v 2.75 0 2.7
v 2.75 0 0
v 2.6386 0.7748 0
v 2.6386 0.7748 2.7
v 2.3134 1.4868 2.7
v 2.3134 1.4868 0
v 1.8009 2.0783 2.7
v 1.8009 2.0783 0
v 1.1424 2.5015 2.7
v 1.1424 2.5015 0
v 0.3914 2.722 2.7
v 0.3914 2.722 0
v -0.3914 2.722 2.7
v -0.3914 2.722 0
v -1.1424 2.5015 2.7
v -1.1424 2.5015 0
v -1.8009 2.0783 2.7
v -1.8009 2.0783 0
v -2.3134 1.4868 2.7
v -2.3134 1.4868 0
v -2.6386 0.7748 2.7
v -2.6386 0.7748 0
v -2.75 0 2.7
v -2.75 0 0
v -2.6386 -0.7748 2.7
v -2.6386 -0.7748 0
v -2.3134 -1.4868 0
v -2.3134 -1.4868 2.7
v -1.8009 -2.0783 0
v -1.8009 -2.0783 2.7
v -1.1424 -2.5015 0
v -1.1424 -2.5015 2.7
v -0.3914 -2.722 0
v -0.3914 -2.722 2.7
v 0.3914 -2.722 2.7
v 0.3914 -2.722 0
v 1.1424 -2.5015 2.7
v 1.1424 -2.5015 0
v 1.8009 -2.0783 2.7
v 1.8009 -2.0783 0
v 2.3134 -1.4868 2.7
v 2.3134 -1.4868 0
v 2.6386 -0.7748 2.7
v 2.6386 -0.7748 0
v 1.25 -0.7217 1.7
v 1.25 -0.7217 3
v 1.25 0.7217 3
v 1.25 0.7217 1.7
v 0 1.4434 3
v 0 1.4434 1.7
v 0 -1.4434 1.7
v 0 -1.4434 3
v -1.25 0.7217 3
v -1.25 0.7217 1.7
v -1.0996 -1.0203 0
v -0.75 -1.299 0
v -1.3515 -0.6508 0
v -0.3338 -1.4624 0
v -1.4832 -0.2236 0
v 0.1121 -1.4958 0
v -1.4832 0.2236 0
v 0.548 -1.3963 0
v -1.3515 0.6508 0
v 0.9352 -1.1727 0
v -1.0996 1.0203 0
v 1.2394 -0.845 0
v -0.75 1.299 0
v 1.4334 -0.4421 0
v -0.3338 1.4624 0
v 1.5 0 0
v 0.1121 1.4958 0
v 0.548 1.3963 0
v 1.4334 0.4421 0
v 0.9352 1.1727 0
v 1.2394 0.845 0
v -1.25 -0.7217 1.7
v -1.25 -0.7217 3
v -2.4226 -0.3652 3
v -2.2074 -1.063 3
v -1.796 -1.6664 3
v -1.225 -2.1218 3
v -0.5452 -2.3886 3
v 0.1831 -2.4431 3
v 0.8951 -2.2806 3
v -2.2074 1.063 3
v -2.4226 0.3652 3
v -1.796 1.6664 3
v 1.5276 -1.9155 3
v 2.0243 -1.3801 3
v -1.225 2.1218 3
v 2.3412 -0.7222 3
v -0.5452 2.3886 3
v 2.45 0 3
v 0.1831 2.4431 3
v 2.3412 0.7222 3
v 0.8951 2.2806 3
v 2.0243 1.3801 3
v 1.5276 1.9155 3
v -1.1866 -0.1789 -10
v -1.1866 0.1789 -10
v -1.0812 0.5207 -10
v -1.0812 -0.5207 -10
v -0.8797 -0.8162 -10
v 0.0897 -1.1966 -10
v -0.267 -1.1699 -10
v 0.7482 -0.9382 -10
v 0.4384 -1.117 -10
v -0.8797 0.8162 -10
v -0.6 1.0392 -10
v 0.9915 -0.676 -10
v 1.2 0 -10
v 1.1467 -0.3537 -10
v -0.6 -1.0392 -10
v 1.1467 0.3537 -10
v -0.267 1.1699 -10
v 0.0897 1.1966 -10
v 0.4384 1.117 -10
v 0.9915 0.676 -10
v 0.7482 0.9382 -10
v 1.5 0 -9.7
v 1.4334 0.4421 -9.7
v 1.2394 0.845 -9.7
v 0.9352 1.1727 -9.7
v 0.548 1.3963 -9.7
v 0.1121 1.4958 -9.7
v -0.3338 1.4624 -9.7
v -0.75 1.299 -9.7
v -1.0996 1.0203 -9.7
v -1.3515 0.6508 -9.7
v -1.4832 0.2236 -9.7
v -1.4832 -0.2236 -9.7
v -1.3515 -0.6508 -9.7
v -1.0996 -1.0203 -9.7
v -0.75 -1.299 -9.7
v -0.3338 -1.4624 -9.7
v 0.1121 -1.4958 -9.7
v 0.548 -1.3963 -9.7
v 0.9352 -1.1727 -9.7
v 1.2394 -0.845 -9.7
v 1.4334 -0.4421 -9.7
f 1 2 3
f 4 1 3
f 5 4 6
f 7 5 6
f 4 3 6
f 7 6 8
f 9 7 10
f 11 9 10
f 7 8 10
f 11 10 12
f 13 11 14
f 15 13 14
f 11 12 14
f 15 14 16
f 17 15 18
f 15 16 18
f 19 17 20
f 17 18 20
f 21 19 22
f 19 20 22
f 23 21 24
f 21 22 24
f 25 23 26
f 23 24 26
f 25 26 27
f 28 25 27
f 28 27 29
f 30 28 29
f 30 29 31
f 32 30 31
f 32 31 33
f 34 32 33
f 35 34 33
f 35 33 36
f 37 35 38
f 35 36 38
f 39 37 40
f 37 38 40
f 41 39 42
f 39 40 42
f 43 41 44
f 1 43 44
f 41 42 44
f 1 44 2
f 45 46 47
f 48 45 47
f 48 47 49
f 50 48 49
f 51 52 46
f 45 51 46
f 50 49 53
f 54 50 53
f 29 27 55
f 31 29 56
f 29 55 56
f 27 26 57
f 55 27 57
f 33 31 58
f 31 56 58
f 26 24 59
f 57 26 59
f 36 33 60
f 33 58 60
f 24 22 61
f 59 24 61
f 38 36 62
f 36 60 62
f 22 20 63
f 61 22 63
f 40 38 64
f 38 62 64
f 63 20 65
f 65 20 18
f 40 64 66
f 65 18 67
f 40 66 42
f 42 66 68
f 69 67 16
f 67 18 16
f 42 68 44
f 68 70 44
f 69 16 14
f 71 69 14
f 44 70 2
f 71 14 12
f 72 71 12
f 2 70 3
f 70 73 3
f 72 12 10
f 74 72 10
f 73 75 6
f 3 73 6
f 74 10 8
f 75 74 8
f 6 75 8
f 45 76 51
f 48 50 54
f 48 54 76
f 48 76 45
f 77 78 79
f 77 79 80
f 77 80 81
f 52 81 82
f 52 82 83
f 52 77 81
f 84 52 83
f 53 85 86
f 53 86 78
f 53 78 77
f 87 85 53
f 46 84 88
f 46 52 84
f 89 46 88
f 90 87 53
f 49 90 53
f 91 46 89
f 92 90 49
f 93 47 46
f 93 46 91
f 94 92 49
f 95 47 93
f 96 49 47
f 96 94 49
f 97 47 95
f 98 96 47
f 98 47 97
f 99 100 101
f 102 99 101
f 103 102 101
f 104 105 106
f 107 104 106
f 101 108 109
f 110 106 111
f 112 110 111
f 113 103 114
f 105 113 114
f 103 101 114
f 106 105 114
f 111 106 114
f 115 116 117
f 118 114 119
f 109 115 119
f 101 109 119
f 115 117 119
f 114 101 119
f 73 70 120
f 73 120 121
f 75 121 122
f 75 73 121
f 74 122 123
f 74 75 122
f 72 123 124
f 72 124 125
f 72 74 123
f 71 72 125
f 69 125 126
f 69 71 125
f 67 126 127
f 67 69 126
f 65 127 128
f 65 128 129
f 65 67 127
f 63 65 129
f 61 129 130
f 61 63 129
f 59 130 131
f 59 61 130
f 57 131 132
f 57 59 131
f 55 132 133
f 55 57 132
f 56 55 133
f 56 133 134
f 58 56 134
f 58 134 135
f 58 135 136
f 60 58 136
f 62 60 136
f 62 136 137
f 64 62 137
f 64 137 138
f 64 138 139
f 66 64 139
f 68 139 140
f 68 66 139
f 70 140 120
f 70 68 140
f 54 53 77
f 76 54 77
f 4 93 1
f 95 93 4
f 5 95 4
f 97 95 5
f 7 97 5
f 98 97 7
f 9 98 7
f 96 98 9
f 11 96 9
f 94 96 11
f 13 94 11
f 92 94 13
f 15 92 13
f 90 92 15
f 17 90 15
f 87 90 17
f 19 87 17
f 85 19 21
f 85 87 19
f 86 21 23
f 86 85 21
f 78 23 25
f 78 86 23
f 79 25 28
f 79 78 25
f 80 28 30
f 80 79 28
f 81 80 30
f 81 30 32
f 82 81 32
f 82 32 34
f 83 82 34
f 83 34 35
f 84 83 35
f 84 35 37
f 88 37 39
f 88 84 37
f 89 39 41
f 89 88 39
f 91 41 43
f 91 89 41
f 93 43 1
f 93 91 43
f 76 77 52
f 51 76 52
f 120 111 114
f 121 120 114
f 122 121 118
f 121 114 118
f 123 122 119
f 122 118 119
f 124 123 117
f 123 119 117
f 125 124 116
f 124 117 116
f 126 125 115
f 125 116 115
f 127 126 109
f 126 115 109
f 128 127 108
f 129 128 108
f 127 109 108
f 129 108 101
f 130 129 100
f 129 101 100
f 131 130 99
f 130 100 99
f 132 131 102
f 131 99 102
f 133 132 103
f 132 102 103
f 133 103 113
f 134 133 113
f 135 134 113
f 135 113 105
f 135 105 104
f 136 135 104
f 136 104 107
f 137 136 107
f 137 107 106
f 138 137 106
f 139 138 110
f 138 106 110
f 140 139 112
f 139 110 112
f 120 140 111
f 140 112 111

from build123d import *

# Parameters (mm, degrees)
F2_R      = 1.5
F3_DEPTH  = 10
F2_R_2    = 2.75
F3_FACE_R = 1.5
F4_DEPTH  = 3
F5_SIZE   = 0.3
F7_DEPTH  = 1.3


with BuildPart() as f3:
    # F2 (on Top) → F3 (new body)
    with BuildSketch(Plane.XY):
        Circle(F2_R)
    extrude(amount=-F3_DEPTH)

    # F2 (on Top) + F3_face (on face) → F4 (join)
    with BuildSketch(Plane.XY):
        Circle(F2_R_2)
        Circle(F2_R, mode=Mode.SUBTRACT)
    with BuildSketch(Plane.XY):
        Circle(F3_FACE_R)
    extrude(amount=F4_DEPTH)

    # F5
    f5_edges = [f3.edges().sort_by_distance(p)[0] for p in [
        (-1.5, 0, -10),
        (-2.75, 0, 3),
    ]]
    chamfer(f5_edges, length=F5_SIZE)

    # F6 (on face) → F7 (cut)
    with BuildSketch(Plane.XY.offset(3)):
        Polygon((1.25, -0.7216878365), (1.25, 0.7216878365), (0, 1.443375673), (-1.25, 0.7216878365), (-1.25, -0.7216878365), (0, -1.443375673), align=None)
    extrude(amount=-F7_DEPTH, mode=Mode.SUBTRACT)


solid = f3.part
